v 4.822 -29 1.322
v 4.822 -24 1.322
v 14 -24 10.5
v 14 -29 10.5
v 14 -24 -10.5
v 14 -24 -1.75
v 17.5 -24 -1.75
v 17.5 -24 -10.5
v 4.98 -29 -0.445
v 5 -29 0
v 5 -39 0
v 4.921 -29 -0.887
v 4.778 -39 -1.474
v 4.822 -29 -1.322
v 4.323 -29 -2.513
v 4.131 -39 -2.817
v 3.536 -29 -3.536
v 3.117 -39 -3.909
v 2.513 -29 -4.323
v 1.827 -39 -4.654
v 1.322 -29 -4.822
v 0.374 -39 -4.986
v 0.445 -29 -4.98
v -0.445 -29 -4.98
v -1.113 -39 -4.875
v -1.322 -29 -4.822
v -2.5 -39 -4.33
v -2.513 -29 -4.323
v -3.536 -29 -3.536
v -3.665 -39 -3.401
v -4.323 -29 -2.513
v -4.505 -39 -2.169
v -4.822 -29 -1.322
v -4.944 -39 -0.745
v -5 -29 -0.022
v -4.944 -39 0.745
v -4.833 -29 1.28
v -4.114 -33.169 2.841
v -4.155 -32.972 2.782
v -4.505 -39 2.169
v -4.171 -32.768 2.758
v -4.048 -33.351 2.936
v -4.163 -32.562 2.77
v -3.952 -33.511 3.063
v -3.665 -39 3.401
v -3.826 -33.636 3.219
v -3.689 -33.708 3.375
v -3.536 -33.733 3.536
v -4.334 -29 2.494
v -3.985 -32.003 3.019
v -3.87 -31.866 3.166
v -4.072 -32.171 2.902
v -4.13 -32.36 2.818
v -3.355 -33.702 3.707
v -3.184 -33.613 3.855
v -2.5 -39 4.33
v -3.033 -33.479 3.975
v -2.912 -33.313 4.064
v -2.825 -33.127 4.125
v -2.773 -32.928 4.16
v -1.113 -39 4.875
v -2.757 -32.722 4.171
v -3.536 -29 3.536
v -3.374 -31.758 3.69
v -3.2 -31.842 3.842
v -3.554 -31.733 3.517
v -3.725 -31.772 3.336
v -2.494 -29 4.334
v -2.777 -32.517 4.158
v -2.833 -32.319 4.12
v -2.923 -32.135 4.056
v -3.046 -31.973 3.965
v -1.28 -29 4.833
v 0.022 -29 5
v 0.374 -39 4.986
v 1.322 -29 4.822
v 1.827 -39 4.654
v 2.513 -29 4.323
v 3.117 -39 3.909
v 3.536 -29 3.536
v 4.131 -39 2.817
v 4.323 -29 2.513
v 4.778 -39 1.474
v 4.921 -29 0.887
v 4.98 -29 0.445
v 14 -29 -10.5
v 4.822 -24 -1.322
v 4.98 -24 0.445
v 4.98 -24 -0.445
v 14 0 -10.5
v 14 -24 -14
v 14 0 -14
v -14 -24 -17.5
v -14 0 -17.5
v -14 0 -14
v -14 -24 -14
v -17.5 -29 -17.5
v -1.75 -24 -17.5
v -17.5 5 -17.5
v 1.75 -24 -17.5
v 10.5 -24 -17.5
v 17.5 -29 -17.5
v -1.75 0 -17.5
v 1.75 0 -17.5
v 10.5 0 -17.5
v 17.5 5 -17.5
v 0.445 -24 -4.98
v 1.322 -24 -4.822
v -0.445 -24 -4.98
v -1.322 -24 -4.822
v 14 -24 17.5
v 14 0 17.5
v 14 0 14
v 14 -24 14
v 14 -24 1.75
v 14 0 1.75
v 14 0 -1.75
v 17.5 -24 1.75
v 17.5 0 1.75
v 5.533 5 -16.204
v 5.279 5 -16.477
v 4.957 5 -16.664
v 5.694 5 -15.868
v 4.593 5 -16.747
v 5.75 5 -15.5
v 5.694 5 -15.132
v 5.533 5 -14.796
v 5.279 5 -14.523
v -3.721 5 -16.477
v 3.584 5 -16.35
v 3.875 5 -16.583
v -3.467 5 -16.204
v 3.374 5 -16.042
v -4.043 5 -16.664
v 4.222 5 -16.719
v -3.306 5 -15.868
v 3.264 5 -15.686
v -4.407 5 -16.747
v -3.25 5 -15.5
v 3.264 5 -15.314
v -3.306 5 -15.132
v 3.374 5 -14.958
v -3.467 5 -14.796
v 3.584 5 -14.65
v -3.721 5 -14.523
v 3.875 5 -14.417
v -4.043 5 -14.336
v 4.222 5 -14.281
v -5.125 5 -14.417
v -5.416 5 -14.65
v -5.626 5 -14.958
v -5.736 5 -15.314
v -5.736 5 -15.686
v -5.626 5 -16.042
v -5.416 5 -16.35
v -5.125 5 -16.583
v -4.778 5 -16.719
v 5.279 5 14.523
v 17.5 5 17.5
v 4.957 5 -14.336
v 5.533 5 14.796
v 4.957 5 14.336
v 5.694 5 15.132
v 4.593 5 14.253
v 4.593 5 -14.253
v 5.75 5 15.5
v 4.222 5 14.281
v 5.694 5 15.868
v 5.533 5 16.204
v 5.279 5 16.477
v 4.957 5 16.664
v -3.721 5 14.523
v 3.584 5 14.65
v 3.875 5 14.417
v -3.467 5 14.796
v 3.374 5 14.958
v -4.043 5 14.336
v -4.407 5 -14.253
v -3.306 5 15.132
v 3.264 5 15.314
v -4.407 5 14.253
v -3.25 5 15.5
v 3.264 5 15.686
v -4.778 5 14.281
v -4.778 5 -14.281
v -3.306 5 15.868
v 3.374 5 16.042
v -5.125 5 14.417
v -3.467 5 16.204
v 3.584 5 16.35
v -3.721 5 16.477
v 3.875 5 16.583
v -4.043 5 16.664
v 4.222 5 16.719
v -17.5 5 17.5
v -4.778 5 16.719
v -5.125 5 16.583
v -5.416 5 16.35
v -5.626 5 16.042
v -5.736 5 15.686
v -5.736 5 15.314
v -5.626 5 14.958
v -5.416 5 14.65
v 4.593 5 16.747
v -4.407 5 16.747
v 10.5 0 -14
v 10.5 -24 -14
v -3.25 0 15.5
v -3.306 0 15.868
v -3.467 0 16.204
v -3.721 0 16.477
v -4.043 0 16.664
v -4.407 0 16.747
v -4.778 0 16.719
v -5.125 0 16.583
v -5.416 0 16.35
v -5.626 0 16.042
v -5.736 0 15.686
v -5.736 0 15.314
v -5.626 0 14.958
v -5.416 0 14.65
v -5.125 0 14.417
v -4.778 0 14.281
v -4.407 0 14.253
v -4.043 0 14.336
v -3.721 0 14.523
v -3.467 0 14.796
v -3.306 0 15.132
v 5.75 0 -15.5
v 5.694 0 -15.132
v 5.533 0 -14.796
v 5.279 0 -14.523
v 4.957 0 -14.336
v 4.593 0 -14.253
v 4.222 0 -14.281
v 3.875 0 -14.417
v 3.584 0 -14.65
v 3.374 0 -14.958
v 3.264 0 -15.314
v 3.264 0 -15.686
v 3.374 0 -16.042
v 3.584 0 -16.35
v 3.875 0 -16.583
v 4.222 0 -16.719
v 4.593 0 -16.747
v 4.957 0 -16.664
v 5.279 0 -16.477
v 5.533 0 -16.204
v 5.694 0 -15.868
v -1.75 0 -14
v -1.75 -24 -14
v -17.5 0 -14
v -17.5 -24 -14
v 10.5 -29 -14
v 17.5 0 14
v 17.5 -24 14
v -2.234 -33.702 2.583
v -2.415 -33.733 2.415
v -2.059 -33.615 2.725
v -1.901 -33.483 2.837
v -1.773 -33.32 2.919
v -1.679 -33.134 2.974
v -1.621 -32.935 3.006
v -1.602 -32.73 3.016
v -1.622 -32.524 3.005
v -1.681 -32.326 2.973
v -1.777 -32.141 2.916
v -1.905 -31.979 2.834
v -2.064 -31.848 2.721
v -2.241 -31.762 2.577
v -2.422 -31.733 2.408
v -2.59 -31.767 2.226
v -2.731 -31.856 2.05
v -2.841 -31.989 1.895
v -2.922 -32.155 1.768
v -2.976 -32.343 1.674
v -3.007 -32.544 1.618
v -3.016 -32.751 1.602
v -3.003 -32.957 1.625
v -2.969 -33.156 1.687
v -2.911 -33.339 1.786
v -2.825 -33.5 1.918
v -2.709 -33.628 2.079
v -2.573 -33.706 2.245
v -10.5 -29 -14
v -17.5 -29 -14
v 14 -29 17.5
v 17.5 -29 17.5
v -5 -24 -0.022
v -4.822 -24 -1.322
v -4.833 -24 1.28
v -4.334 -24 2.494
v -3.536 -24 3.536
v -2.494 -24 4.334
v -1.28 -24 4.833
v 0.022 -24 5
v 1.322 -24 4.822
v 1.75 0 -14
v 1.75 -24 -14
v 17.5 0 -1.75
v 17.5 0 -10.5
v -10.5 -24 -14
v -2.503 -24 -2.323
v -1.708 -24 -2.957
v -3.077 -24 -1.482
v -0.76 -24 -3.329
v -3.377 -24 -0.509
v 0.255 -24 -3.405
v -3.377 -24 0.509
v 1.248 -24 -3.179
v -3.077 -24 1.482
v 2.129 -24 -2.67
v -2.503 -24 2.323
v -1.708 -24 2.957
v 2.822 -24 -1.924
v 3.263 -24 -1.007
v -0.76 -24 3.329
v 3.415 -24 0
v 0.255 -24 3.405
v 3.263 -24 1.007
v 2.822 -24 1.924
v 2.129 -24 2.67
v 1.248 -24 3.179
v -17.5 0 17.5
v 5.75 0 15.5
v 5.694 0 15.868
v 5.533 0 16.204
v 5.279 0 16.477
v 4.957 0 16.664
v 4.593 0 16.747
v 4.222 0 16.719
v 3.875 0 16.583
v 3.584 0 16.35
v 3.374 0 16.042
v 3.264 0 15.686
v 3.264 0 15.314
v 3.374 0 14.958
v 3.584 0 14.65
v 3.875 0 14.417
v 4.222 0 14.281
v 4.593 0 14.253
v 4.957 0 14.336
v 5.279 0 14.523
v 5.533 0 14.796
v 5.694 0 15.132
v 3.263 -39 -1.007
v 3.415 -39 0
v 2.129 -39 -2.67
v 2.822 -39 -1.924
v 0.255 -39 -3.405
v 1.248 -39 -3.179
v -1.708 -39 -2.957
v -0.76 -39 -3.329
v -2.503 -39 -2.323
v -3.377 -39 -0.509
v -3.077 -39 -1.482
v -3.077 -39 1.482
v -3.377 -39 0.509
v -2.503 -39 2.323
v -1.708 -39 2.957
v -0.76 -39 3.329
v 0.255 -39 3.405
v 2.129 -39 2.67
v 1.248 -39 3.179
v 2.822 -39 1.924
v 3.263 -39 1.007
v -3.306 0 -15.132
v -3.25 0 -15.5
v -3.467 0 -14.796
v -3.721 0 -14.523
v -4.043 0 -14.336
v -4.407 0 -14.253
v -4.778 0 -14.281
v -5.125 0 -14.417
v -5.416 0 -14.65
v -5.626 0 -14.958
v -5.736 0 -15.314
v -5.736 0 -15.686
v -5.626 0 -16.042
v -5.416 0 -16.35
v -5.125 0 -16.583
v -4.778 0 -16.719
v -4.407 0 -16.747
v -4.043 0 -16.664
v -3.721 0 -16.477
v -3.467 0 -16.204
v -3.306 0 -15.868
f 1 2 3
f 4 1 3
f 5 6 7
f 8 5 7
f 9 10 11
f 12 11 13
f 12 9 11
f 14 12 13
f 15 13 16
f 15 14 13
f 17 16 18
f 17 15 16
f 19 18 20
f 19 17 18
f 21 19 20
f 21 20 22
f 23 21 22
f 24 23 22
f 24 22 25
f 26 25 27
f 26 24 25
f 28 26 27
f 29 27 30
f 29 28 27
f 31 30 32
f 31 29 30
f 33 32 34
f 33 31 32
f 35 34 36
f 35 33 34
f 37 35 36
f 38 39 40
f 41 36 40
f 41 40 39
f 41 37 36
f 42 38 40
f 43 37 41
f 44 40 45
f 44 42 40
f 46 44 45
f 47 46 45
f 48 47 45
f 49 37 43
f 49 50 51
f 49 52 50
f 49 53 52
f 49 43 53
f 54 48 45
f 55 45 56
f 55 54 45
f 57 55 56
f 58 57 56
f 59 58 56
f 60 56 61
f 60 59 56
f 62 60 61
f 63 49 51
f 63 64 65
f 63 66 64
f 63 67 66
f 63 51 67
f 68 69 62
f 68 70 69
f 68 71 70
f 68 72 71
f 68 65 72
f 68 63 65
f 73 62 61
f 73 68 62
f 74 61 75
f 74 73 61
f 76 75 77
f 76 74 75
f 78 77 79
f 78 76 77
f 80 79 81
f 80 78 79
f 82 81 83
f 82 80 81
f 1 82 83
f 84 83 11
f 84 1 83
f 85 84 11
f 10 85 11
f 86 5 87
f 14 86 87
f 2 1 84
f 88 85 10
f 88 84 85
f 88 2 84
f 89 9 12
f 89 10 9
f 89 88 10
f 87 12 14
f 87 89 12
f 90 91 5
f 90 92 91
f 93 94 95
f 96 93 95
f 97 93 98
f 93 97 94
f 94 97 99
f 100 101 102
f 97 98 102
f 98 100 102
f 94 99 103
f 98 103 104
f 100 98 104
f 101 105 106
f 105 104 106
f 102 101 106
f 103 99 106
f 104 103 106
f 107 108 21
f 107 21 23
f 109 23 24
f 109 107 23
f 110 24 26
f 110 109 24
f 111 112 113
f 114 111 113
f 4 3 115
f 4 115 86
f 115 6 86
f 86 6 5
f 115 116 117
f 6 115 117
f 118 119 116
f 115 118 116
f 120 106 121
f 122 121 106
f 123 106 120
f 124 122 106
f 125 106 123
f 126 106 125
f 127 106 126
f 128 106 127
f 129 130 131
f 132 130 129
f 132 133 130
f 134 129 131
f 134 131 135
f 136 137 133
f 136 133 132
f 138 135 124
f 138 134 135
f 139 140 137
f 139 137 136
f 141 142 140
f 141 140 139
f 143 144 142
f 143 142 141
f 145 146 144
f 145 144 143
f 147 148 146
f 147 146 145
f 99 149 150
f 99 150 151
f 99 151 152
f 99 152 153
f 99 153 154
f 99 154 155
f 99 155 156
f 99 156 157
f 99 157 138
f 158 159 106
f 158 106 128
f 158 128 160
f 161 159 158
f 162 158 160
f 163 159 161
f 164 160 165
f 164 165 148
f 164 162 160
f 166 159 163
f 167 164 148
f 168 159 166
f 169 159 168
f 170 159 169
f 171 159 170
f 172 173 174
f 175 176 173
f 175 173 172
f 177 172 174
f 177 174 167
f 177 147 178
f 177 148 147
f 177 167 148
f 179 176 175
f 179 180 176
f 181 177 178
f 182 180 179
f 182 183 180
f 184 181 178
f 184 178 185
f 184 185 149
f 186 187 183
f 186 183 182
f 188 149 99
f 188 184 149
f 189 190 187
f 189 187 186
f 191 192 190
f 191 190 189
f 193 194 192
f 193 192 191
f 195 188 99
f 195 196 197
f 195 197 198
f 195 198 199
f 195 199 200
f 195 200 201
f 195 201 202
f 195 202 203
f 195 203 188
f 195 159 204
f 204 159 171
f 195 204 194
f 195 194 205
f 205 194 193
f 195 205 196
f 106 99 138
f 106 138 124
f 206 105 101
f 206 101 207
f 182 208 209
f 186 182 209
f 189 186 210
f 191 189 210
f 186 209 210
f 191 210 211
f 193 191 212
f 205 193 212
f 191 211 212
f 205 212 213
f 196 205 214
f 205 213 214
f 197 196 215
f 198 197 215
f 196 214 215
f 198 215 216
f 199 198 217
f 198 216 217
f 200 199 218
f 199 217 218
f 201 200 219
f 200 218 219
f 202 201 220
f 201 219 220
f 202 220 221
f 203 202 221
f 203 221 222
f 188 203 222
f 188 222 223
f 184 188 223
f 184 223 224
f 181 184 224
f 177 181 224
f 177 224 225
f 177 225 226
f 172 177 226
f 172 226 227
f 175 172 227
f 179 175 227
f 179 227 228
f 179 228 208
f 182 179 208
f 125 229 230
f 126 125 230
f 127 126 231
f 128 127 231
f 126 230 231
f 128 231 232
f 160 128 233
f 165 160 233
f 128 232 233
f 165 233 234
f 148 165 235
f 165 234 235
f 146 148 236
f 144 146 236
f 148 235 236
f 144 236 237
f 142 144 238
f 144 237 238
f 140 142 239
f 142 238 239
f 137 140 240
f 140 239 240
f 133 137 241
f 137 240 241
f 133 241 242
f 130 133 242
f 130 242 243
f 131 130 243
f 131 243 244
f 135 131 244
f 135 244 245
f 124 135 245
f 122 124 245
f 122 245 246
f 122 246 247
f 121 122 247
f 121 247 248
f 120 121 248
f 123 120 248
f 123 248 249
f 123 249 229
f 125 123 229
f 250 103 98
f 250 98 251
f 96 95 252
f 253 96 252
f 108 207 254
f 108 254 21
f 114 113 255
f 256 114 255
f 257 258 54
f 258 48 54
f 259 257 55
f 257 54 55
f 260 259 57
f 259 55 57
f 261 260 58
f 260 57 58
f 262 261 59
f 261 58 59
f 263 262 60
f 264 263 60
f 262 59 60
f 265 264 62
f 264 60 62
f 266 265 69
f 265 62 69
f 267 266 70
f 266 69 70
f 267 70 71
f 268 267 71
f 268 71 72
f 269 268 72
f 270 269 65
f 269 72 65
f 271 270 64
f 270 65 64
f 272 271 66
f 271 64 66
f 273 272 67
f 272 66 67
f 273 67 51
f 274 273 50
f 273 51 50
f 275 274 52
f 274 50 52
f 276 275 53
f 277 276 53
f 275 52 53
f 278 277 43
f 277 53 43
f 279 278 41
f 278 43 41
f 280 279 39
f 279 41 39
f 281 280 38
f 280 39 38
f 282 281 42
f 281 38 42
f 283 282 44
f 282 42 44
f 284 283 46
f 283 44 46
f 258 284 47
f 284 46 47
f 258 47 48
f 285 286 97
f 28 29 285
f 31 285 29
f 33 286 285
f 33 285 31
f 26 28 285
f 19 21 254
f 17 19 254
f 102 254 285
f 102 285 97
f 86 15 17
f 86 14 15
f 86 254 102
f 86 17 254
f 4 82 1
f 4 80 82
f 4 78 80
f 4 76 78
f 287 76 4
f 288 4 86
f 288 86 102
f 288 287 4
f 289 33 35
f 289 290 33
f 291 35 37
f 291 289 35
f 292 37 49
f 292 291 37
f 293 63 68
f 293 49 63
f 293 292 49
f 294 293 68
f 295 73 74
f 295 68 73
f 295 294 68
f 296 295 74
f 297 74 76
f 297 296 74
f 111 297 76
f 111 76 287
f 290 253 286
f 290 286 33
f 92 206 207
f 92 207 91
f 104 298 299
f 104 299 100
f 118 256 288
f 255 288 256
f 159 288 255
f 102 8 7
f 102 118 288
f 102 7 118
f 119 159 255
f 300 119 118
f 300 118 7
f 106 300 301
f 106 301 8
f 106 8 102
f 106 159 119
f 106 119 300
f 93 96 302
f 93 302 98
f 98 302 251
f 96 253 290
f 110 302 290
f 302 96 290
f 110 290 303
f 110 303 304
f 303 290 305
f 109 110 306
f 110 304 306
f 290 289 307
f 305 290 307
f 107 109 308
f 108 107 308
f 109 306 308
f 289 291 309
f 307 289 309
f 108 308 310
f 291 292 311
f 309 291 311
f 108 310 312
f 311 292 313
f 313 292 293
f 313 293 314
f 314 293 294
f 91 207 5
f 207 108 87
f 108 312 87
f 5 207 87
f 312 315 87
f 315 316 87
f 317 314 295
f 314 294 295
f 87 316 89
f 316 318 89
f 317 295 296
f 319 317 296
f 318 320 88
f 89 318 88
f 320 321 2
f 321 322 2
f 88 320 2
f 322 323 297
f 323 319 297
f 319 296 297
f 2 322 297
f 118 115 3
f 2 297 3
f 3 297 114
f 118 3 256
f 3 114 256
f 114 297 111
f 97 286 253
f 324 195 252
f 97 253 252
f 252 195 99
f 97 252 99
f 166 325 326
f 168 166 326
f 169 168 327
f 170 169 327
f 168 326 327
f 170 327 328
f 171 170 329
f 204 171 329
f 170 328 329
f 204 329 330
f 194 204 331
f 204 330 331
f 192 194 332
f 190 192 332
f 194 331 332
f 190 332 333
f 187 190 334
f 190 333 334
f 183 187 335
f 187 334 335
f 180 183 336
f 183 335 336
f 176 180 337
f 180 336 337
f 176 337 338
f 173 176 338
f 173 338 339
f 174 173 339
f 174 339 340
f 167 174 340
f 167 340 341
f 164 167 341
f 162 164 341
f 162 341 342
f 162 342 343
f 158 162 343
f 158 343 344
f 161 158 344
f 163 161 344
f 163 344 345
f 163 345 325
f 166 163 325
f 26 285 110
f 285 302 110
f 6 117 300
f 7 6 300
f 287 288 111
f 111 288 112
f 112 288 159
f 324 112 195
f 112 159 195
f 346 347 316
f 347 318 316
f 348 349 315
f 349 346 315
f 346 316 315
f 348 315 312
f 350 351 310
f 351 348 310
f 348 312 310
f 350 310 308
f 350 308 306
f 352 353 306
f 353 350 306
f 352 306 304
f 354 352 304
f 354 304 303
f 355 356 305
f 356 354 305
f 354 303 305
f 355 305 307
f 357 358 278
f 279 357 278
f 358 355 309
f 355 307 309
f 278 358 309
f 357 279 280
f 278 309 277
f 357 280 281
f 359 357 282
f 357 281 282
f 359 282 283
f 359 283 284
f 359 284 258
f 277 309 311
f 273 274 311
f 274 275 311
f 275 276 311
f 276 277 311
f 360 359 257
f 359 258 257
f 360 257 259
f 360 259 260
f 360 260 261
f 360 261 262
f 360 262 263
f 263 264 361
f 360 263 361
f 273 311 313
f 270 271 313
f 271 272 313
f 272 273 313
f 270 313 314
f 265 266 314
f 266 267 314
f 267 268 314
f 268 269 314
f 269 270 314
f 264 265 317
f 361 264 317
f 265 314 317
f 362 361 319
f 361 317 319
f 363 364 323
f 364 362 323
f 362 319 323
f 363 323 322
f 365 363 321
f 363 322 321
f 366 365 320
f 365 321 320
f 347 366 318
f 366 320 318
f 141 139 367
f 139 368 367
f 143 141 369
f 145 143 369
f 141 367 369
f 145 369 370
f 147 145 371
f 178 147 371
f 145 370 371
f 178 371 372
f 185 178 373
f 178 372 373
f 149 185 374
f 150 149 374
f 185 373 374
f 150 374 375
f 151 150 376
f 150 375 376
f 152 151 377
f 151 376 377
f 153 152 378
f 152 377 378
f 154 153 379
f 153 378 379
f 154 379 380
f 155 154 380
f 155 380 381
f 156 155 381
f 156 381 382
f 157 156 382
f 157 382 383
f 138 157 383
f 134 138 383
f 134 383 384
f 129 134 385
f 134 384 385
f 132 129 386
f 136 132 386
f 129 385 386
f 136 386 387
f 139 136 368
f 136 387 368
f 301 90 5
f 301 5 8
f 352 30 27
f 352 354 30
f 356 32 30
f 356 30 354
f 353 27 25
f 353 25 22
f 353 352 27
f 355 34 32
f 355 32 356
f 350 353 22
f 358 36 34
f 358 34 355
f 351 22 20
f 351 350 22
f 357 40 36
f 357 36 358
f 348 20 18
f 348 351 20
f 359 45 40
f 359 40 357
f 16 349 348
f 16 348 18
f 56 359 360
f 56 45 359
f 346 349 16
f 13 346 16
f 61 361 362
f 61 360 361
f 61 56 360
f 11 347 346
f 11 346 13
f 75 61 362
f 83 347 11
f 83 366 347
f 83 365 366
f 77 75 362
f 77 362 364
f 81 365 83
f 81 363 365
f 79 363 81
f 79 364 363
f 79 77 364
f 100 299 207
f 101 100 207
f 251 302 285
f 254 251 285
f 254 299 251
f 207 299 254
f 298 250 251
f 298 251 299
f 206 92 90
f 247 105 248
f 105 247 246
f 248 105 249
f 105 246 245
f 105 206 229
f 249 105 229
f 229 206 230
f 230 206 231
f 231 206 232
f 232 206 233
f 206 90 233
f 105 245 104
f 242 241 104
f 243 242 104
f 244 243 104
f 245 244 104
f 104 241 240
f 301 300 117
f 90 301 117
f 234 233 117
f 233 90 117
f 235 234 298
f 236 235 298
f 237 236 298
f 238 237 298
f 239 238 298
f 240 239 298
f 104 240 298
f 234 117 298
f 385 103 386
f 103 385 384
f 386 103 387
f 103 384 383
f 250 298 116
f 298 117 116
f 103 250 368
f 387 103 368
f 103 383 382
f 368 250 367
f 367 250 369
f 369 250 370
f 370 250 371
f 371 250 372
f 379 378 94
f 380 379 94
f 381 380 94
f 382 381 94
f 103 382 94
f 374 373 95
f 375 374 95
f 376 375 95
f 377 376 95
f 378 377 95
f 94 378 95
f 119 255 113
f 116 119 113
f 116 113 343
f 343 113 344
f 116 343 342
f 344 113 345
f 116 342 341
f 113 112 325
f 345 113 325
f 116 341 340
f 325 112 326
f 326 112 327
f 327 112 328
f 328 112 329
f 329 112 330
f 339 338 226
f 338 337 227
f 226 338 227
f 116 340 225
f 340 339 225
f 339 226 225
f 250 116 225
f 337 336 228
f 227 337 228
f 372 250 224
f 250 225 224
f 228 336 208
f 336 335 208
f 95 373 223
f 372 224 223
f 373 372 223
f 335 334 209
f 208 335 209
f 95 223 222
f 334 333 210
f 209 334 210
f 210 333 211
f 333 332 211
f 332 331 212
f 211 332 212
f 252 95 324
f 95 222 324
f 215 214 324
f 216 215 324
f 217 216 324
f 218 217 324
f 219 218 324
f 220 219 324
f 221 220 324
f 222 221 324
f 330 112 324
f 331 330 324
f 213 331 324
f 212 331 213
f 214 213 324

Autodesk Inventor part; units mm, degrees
ref_plane "YZ Plane" through (0, 0, 0) normal (1, 0, 0) x (0, 1, 0)
ref_plane "XZ Plane" through (0, 0, 0) normal (0, 1, 0) x (-1, 0, 0)
ref_plane "XY Plane" through (0, 0, 0) normal (0, 0, 1) x (1, 0, 0)
sketch "Sketch1" plane through (0, 0, 0) normal (0, 1, 0) x (-1, 0, 0)
  line L0 (-17.5, -17.5) -> (17.5, -17.5)
  line L1 (17.5, -17.5) -> (17.5, 17.5)
  line L2 (17.5, 17.5) -> (-17.5, 17.5)
  line L3 (-17.5, 17.5) -> (-17.5, -17.5)
  line L4 (-17.5, -17.5) -> (17.5, 17.5) construction
  line L5 (17.5, -17.5) -> (-17.5, 17.5) construction
  point P0 (0, 0)
  dimension "d0" = 35
  dimension "d1" = 35
extrude "Extrusion1" add sketch "Sketch1" along normal blind 5
sketch "Sketch2" plane through (0, 0, 0) normal (0, -1, 0) x (1, 0, 0)
  circle A0 centre (4.5, 15.5) radius 1.25 projected
  circle A1 centre (-4.5, 15.5) radius 1.25 projected
  circle A2 centre (4.5, -15.5) radius 1.25 projected
  circle A3 centre (-4.5, -15.5) radius 1.25 projected
  point P0 (0, 0)
extrude "Extrusion2" cut sketch "Sketch2" against normal blind 5
sketch "Sketch3" plane through (0, 0, 0) normal (0, -1, 0) x (1, 0, 0)
  line L0 (-17.5, -17.5) -> (-17.5, 17.5) projected
  line L1 (-17.5, -17.5) -> (-14, -17.5)
  line L2 (-14, -17.5) -> (-14, -14)
  line L3 (-14, -14) -> (-17.5, -14)
  line L4 (-17.5, -14) -> (-17.5, -17.5)
  line L5 (17.5, 17.5) -> (17.5, -17.5) projected
  line L6 (17.5, -17.5) -> (10.5, -17.5)
  line L7 (10.5, -17.5) -> (10.5, -14)
  line L8 (10.5, -14) -> (17.5, -14)
  line L9 (17.5, -14) -> (17.5, -17.5)
  line L10 (17.5, -14) -> (14, -14)
  line L11 (14, -14) -> (14, -10.5)
  line L12 (14, -10.5) -> (17.5, -10.5)
  line L13 (17.5, -10.5) -> (17.5, -14)
  line L14 (17.5, 17.5) -> (14, 17.5)
  line L15 (14, 17.5) -> (14, 14)
  line L16 (14, 14) -> (17.5, 14)
  line L17 (17.5, 14) -> (17.5, 17.5)
  line L18 (17.5, -17.5) -> (-17.5, -17.5) projected
  line L19 (1.75, -17.5) -> (-1.75, -17.5)
  line L20 (-1.75, -17.5) -> (-1.75, -14)
  line L21 (-1.75, -14) -> (1.75, -14)
  line L22 (1.75, -14) -> (1.75, -17.5)
  line L23 (17.5, 17.5) -> (17.5, -17.5) projected
  line L24 (17.5, 1.75) -> (14, 1.75)
  line L25 (14, 1.75) -> (14, -1.75)
  line L26 (14, -1.75) -> (17.5, -1.75)
  line L27 (17.5, -1.75) -> (17.5, 1.75)
  point P0 (0, 0)
  dimension "d6" = 3.5
  dimension "d7" = 3.5
  dimension "d8" = 7
  dimension "d9" = 3.5
  dimension "d10" = 3.5
  dimension "d11" = 3.5
  dimension "d12" = 3.5
  dimension "d13" = 3.5
  dimension "d14" = 3.5
  dimension "d15" = 3.5
  dimension "d16" = 3.5
  dimension "d17" = 3.5
  dimension "d18" = 1.75
  dimension "d19" = 1.75
extrude "Extrusion3" add sketch "Sketch3" along normal blind 24
sketch "Sketch4" plane through (0, -24, 0) normal (0, -1, 0) x (1, 0, 0)
  line L0 (-17.5, -14) -> (-14, -14) projected
  line L1 (14, 14) -> (14, 17.5) projected
  line L2 (10.5, -17.5) -> (10.5, -14) projected
  line L3 (14, -10.5) -> (17.5, -10.5) projected
  line L4 (-17.5, -14) -> (-17.5, -17.5) projected
  line L5 (-17.5, -14) -> (-17.5, -17.5)
  line L6 (17.5, 17.5) -> (17.5, -17.5) projected
  line L7 (-17.5, -17.5) -> (17.5, -17.5)
  line L8 (17.5, -17.5) -> (17.5, 17.5)
  line L9 (17.5, 17.5) -> (14, 17.5) projected
  line L10 (17.5, 17.5) -> (14, 17.5)
  line L11 (14, -14) -> (10.5, -14) projected
  line L12 (14, 17.5) -> (14, 14) projected
  line L13 (-17.5, -14) -> (-4.8221, -1.3221)
  line L14 (1.3221, 4.8221) -> (14, 17.5)
  line L15 (-10.5, -14) -> (-1.3221, -4.8221)
  line L16 (4.8221, 1.3221) -> (14, 10.5)
  line L17 (10.5, -14) -> (7.875, -11.375)
  line L18 (4.375, -7.875) -> (1.3221, -4.8221)
  line L19 (14, -10.5) -> (11.375, -7.875)
  line L20 (7.875, -4.375) -> (4.8221, -1.3221)
  line L21 (-10.5, -14) -> (-1.75, -14)
  line L22 (5.25, -14) -> (10.5, -14)
  circle A0 centre (0, 0) radius 3.415
  arc A1 (-1.3221, -4.8221) -> (1.3221, -4.8221) centre (0, 0) ccw
  arc A2 (4.8221, -1.3221) -> (4.8221, 1.3221) centre (0, 0) ccw
  arc A3 (1.3221, 4.8221) -> (-4.8221, -1.3221) centre (0, 0) ccw
  line L23 (10.5, -14) -> (7.875, -11.375)
  line L24 (10.5, -14) -> (14, -14) projected
  line L25 (5.25, -14) -> (10.5, -14)
  line L26 (-1.75, -17.5) -> (-1.75, -14) projected
  line L27 (-1.75, -14) -> (5.25, -14)
  line L28 (14, -1.75) -> (14, 1.75) projected
  line L29 (7.875, -4.375) -> (11.375, -7.875)
  line L30 (7.875, -11.375) -> (4.375, -7.875)
  line L31 (14, 10.5) -> (14, -10.5)
  point P0 (-14, -17.5)
  point P1 (17.5, 14)
  point P2 (17.5, -1.75)
  dimension "d28" = 6.83
ref_plane "Work Plane1" through (-3.5355, -24, 3.5355) normal (-0.7071068, 0, 0.7071068) x (0, -1, 0)
ref_plane "Work Plane2" through (0, -29, 0) normal (0, -1, 0) x (1, 0, 0)
sketch "Sketch6" plane through (0, -29, 0) normal (0, -1, 0) x (1, 0, 0)
  circle A0 centre (0, 0) radius 3.415
  circle A1 centre (0, 0) radius 5
extrude "Extrusion6" add sketch "Sketch6" along normal blind 10
sketch "Sketch7" plane through (-3.5355, -24, 3.5355) normal (-0.7071068, 0, 0.7071068) x (0, -1, 0)
  circle A0 centre (8.733, 0) radius 1
  point P0 (-24, 0)
  dimension "d31" = 2
extrude "Extrusion7" cut sketch "Sketch7" against normal blind 2
extrude "Extrusion9" add sketch "Sketch4" along normal blind 5 contours L7 L26 L27 L22 L2 | L2 L17 L30 L18 A1 L15 L21 L26 L7 L4 L13 A3 L14 L9 L6
properties part number "Sy_holder"
